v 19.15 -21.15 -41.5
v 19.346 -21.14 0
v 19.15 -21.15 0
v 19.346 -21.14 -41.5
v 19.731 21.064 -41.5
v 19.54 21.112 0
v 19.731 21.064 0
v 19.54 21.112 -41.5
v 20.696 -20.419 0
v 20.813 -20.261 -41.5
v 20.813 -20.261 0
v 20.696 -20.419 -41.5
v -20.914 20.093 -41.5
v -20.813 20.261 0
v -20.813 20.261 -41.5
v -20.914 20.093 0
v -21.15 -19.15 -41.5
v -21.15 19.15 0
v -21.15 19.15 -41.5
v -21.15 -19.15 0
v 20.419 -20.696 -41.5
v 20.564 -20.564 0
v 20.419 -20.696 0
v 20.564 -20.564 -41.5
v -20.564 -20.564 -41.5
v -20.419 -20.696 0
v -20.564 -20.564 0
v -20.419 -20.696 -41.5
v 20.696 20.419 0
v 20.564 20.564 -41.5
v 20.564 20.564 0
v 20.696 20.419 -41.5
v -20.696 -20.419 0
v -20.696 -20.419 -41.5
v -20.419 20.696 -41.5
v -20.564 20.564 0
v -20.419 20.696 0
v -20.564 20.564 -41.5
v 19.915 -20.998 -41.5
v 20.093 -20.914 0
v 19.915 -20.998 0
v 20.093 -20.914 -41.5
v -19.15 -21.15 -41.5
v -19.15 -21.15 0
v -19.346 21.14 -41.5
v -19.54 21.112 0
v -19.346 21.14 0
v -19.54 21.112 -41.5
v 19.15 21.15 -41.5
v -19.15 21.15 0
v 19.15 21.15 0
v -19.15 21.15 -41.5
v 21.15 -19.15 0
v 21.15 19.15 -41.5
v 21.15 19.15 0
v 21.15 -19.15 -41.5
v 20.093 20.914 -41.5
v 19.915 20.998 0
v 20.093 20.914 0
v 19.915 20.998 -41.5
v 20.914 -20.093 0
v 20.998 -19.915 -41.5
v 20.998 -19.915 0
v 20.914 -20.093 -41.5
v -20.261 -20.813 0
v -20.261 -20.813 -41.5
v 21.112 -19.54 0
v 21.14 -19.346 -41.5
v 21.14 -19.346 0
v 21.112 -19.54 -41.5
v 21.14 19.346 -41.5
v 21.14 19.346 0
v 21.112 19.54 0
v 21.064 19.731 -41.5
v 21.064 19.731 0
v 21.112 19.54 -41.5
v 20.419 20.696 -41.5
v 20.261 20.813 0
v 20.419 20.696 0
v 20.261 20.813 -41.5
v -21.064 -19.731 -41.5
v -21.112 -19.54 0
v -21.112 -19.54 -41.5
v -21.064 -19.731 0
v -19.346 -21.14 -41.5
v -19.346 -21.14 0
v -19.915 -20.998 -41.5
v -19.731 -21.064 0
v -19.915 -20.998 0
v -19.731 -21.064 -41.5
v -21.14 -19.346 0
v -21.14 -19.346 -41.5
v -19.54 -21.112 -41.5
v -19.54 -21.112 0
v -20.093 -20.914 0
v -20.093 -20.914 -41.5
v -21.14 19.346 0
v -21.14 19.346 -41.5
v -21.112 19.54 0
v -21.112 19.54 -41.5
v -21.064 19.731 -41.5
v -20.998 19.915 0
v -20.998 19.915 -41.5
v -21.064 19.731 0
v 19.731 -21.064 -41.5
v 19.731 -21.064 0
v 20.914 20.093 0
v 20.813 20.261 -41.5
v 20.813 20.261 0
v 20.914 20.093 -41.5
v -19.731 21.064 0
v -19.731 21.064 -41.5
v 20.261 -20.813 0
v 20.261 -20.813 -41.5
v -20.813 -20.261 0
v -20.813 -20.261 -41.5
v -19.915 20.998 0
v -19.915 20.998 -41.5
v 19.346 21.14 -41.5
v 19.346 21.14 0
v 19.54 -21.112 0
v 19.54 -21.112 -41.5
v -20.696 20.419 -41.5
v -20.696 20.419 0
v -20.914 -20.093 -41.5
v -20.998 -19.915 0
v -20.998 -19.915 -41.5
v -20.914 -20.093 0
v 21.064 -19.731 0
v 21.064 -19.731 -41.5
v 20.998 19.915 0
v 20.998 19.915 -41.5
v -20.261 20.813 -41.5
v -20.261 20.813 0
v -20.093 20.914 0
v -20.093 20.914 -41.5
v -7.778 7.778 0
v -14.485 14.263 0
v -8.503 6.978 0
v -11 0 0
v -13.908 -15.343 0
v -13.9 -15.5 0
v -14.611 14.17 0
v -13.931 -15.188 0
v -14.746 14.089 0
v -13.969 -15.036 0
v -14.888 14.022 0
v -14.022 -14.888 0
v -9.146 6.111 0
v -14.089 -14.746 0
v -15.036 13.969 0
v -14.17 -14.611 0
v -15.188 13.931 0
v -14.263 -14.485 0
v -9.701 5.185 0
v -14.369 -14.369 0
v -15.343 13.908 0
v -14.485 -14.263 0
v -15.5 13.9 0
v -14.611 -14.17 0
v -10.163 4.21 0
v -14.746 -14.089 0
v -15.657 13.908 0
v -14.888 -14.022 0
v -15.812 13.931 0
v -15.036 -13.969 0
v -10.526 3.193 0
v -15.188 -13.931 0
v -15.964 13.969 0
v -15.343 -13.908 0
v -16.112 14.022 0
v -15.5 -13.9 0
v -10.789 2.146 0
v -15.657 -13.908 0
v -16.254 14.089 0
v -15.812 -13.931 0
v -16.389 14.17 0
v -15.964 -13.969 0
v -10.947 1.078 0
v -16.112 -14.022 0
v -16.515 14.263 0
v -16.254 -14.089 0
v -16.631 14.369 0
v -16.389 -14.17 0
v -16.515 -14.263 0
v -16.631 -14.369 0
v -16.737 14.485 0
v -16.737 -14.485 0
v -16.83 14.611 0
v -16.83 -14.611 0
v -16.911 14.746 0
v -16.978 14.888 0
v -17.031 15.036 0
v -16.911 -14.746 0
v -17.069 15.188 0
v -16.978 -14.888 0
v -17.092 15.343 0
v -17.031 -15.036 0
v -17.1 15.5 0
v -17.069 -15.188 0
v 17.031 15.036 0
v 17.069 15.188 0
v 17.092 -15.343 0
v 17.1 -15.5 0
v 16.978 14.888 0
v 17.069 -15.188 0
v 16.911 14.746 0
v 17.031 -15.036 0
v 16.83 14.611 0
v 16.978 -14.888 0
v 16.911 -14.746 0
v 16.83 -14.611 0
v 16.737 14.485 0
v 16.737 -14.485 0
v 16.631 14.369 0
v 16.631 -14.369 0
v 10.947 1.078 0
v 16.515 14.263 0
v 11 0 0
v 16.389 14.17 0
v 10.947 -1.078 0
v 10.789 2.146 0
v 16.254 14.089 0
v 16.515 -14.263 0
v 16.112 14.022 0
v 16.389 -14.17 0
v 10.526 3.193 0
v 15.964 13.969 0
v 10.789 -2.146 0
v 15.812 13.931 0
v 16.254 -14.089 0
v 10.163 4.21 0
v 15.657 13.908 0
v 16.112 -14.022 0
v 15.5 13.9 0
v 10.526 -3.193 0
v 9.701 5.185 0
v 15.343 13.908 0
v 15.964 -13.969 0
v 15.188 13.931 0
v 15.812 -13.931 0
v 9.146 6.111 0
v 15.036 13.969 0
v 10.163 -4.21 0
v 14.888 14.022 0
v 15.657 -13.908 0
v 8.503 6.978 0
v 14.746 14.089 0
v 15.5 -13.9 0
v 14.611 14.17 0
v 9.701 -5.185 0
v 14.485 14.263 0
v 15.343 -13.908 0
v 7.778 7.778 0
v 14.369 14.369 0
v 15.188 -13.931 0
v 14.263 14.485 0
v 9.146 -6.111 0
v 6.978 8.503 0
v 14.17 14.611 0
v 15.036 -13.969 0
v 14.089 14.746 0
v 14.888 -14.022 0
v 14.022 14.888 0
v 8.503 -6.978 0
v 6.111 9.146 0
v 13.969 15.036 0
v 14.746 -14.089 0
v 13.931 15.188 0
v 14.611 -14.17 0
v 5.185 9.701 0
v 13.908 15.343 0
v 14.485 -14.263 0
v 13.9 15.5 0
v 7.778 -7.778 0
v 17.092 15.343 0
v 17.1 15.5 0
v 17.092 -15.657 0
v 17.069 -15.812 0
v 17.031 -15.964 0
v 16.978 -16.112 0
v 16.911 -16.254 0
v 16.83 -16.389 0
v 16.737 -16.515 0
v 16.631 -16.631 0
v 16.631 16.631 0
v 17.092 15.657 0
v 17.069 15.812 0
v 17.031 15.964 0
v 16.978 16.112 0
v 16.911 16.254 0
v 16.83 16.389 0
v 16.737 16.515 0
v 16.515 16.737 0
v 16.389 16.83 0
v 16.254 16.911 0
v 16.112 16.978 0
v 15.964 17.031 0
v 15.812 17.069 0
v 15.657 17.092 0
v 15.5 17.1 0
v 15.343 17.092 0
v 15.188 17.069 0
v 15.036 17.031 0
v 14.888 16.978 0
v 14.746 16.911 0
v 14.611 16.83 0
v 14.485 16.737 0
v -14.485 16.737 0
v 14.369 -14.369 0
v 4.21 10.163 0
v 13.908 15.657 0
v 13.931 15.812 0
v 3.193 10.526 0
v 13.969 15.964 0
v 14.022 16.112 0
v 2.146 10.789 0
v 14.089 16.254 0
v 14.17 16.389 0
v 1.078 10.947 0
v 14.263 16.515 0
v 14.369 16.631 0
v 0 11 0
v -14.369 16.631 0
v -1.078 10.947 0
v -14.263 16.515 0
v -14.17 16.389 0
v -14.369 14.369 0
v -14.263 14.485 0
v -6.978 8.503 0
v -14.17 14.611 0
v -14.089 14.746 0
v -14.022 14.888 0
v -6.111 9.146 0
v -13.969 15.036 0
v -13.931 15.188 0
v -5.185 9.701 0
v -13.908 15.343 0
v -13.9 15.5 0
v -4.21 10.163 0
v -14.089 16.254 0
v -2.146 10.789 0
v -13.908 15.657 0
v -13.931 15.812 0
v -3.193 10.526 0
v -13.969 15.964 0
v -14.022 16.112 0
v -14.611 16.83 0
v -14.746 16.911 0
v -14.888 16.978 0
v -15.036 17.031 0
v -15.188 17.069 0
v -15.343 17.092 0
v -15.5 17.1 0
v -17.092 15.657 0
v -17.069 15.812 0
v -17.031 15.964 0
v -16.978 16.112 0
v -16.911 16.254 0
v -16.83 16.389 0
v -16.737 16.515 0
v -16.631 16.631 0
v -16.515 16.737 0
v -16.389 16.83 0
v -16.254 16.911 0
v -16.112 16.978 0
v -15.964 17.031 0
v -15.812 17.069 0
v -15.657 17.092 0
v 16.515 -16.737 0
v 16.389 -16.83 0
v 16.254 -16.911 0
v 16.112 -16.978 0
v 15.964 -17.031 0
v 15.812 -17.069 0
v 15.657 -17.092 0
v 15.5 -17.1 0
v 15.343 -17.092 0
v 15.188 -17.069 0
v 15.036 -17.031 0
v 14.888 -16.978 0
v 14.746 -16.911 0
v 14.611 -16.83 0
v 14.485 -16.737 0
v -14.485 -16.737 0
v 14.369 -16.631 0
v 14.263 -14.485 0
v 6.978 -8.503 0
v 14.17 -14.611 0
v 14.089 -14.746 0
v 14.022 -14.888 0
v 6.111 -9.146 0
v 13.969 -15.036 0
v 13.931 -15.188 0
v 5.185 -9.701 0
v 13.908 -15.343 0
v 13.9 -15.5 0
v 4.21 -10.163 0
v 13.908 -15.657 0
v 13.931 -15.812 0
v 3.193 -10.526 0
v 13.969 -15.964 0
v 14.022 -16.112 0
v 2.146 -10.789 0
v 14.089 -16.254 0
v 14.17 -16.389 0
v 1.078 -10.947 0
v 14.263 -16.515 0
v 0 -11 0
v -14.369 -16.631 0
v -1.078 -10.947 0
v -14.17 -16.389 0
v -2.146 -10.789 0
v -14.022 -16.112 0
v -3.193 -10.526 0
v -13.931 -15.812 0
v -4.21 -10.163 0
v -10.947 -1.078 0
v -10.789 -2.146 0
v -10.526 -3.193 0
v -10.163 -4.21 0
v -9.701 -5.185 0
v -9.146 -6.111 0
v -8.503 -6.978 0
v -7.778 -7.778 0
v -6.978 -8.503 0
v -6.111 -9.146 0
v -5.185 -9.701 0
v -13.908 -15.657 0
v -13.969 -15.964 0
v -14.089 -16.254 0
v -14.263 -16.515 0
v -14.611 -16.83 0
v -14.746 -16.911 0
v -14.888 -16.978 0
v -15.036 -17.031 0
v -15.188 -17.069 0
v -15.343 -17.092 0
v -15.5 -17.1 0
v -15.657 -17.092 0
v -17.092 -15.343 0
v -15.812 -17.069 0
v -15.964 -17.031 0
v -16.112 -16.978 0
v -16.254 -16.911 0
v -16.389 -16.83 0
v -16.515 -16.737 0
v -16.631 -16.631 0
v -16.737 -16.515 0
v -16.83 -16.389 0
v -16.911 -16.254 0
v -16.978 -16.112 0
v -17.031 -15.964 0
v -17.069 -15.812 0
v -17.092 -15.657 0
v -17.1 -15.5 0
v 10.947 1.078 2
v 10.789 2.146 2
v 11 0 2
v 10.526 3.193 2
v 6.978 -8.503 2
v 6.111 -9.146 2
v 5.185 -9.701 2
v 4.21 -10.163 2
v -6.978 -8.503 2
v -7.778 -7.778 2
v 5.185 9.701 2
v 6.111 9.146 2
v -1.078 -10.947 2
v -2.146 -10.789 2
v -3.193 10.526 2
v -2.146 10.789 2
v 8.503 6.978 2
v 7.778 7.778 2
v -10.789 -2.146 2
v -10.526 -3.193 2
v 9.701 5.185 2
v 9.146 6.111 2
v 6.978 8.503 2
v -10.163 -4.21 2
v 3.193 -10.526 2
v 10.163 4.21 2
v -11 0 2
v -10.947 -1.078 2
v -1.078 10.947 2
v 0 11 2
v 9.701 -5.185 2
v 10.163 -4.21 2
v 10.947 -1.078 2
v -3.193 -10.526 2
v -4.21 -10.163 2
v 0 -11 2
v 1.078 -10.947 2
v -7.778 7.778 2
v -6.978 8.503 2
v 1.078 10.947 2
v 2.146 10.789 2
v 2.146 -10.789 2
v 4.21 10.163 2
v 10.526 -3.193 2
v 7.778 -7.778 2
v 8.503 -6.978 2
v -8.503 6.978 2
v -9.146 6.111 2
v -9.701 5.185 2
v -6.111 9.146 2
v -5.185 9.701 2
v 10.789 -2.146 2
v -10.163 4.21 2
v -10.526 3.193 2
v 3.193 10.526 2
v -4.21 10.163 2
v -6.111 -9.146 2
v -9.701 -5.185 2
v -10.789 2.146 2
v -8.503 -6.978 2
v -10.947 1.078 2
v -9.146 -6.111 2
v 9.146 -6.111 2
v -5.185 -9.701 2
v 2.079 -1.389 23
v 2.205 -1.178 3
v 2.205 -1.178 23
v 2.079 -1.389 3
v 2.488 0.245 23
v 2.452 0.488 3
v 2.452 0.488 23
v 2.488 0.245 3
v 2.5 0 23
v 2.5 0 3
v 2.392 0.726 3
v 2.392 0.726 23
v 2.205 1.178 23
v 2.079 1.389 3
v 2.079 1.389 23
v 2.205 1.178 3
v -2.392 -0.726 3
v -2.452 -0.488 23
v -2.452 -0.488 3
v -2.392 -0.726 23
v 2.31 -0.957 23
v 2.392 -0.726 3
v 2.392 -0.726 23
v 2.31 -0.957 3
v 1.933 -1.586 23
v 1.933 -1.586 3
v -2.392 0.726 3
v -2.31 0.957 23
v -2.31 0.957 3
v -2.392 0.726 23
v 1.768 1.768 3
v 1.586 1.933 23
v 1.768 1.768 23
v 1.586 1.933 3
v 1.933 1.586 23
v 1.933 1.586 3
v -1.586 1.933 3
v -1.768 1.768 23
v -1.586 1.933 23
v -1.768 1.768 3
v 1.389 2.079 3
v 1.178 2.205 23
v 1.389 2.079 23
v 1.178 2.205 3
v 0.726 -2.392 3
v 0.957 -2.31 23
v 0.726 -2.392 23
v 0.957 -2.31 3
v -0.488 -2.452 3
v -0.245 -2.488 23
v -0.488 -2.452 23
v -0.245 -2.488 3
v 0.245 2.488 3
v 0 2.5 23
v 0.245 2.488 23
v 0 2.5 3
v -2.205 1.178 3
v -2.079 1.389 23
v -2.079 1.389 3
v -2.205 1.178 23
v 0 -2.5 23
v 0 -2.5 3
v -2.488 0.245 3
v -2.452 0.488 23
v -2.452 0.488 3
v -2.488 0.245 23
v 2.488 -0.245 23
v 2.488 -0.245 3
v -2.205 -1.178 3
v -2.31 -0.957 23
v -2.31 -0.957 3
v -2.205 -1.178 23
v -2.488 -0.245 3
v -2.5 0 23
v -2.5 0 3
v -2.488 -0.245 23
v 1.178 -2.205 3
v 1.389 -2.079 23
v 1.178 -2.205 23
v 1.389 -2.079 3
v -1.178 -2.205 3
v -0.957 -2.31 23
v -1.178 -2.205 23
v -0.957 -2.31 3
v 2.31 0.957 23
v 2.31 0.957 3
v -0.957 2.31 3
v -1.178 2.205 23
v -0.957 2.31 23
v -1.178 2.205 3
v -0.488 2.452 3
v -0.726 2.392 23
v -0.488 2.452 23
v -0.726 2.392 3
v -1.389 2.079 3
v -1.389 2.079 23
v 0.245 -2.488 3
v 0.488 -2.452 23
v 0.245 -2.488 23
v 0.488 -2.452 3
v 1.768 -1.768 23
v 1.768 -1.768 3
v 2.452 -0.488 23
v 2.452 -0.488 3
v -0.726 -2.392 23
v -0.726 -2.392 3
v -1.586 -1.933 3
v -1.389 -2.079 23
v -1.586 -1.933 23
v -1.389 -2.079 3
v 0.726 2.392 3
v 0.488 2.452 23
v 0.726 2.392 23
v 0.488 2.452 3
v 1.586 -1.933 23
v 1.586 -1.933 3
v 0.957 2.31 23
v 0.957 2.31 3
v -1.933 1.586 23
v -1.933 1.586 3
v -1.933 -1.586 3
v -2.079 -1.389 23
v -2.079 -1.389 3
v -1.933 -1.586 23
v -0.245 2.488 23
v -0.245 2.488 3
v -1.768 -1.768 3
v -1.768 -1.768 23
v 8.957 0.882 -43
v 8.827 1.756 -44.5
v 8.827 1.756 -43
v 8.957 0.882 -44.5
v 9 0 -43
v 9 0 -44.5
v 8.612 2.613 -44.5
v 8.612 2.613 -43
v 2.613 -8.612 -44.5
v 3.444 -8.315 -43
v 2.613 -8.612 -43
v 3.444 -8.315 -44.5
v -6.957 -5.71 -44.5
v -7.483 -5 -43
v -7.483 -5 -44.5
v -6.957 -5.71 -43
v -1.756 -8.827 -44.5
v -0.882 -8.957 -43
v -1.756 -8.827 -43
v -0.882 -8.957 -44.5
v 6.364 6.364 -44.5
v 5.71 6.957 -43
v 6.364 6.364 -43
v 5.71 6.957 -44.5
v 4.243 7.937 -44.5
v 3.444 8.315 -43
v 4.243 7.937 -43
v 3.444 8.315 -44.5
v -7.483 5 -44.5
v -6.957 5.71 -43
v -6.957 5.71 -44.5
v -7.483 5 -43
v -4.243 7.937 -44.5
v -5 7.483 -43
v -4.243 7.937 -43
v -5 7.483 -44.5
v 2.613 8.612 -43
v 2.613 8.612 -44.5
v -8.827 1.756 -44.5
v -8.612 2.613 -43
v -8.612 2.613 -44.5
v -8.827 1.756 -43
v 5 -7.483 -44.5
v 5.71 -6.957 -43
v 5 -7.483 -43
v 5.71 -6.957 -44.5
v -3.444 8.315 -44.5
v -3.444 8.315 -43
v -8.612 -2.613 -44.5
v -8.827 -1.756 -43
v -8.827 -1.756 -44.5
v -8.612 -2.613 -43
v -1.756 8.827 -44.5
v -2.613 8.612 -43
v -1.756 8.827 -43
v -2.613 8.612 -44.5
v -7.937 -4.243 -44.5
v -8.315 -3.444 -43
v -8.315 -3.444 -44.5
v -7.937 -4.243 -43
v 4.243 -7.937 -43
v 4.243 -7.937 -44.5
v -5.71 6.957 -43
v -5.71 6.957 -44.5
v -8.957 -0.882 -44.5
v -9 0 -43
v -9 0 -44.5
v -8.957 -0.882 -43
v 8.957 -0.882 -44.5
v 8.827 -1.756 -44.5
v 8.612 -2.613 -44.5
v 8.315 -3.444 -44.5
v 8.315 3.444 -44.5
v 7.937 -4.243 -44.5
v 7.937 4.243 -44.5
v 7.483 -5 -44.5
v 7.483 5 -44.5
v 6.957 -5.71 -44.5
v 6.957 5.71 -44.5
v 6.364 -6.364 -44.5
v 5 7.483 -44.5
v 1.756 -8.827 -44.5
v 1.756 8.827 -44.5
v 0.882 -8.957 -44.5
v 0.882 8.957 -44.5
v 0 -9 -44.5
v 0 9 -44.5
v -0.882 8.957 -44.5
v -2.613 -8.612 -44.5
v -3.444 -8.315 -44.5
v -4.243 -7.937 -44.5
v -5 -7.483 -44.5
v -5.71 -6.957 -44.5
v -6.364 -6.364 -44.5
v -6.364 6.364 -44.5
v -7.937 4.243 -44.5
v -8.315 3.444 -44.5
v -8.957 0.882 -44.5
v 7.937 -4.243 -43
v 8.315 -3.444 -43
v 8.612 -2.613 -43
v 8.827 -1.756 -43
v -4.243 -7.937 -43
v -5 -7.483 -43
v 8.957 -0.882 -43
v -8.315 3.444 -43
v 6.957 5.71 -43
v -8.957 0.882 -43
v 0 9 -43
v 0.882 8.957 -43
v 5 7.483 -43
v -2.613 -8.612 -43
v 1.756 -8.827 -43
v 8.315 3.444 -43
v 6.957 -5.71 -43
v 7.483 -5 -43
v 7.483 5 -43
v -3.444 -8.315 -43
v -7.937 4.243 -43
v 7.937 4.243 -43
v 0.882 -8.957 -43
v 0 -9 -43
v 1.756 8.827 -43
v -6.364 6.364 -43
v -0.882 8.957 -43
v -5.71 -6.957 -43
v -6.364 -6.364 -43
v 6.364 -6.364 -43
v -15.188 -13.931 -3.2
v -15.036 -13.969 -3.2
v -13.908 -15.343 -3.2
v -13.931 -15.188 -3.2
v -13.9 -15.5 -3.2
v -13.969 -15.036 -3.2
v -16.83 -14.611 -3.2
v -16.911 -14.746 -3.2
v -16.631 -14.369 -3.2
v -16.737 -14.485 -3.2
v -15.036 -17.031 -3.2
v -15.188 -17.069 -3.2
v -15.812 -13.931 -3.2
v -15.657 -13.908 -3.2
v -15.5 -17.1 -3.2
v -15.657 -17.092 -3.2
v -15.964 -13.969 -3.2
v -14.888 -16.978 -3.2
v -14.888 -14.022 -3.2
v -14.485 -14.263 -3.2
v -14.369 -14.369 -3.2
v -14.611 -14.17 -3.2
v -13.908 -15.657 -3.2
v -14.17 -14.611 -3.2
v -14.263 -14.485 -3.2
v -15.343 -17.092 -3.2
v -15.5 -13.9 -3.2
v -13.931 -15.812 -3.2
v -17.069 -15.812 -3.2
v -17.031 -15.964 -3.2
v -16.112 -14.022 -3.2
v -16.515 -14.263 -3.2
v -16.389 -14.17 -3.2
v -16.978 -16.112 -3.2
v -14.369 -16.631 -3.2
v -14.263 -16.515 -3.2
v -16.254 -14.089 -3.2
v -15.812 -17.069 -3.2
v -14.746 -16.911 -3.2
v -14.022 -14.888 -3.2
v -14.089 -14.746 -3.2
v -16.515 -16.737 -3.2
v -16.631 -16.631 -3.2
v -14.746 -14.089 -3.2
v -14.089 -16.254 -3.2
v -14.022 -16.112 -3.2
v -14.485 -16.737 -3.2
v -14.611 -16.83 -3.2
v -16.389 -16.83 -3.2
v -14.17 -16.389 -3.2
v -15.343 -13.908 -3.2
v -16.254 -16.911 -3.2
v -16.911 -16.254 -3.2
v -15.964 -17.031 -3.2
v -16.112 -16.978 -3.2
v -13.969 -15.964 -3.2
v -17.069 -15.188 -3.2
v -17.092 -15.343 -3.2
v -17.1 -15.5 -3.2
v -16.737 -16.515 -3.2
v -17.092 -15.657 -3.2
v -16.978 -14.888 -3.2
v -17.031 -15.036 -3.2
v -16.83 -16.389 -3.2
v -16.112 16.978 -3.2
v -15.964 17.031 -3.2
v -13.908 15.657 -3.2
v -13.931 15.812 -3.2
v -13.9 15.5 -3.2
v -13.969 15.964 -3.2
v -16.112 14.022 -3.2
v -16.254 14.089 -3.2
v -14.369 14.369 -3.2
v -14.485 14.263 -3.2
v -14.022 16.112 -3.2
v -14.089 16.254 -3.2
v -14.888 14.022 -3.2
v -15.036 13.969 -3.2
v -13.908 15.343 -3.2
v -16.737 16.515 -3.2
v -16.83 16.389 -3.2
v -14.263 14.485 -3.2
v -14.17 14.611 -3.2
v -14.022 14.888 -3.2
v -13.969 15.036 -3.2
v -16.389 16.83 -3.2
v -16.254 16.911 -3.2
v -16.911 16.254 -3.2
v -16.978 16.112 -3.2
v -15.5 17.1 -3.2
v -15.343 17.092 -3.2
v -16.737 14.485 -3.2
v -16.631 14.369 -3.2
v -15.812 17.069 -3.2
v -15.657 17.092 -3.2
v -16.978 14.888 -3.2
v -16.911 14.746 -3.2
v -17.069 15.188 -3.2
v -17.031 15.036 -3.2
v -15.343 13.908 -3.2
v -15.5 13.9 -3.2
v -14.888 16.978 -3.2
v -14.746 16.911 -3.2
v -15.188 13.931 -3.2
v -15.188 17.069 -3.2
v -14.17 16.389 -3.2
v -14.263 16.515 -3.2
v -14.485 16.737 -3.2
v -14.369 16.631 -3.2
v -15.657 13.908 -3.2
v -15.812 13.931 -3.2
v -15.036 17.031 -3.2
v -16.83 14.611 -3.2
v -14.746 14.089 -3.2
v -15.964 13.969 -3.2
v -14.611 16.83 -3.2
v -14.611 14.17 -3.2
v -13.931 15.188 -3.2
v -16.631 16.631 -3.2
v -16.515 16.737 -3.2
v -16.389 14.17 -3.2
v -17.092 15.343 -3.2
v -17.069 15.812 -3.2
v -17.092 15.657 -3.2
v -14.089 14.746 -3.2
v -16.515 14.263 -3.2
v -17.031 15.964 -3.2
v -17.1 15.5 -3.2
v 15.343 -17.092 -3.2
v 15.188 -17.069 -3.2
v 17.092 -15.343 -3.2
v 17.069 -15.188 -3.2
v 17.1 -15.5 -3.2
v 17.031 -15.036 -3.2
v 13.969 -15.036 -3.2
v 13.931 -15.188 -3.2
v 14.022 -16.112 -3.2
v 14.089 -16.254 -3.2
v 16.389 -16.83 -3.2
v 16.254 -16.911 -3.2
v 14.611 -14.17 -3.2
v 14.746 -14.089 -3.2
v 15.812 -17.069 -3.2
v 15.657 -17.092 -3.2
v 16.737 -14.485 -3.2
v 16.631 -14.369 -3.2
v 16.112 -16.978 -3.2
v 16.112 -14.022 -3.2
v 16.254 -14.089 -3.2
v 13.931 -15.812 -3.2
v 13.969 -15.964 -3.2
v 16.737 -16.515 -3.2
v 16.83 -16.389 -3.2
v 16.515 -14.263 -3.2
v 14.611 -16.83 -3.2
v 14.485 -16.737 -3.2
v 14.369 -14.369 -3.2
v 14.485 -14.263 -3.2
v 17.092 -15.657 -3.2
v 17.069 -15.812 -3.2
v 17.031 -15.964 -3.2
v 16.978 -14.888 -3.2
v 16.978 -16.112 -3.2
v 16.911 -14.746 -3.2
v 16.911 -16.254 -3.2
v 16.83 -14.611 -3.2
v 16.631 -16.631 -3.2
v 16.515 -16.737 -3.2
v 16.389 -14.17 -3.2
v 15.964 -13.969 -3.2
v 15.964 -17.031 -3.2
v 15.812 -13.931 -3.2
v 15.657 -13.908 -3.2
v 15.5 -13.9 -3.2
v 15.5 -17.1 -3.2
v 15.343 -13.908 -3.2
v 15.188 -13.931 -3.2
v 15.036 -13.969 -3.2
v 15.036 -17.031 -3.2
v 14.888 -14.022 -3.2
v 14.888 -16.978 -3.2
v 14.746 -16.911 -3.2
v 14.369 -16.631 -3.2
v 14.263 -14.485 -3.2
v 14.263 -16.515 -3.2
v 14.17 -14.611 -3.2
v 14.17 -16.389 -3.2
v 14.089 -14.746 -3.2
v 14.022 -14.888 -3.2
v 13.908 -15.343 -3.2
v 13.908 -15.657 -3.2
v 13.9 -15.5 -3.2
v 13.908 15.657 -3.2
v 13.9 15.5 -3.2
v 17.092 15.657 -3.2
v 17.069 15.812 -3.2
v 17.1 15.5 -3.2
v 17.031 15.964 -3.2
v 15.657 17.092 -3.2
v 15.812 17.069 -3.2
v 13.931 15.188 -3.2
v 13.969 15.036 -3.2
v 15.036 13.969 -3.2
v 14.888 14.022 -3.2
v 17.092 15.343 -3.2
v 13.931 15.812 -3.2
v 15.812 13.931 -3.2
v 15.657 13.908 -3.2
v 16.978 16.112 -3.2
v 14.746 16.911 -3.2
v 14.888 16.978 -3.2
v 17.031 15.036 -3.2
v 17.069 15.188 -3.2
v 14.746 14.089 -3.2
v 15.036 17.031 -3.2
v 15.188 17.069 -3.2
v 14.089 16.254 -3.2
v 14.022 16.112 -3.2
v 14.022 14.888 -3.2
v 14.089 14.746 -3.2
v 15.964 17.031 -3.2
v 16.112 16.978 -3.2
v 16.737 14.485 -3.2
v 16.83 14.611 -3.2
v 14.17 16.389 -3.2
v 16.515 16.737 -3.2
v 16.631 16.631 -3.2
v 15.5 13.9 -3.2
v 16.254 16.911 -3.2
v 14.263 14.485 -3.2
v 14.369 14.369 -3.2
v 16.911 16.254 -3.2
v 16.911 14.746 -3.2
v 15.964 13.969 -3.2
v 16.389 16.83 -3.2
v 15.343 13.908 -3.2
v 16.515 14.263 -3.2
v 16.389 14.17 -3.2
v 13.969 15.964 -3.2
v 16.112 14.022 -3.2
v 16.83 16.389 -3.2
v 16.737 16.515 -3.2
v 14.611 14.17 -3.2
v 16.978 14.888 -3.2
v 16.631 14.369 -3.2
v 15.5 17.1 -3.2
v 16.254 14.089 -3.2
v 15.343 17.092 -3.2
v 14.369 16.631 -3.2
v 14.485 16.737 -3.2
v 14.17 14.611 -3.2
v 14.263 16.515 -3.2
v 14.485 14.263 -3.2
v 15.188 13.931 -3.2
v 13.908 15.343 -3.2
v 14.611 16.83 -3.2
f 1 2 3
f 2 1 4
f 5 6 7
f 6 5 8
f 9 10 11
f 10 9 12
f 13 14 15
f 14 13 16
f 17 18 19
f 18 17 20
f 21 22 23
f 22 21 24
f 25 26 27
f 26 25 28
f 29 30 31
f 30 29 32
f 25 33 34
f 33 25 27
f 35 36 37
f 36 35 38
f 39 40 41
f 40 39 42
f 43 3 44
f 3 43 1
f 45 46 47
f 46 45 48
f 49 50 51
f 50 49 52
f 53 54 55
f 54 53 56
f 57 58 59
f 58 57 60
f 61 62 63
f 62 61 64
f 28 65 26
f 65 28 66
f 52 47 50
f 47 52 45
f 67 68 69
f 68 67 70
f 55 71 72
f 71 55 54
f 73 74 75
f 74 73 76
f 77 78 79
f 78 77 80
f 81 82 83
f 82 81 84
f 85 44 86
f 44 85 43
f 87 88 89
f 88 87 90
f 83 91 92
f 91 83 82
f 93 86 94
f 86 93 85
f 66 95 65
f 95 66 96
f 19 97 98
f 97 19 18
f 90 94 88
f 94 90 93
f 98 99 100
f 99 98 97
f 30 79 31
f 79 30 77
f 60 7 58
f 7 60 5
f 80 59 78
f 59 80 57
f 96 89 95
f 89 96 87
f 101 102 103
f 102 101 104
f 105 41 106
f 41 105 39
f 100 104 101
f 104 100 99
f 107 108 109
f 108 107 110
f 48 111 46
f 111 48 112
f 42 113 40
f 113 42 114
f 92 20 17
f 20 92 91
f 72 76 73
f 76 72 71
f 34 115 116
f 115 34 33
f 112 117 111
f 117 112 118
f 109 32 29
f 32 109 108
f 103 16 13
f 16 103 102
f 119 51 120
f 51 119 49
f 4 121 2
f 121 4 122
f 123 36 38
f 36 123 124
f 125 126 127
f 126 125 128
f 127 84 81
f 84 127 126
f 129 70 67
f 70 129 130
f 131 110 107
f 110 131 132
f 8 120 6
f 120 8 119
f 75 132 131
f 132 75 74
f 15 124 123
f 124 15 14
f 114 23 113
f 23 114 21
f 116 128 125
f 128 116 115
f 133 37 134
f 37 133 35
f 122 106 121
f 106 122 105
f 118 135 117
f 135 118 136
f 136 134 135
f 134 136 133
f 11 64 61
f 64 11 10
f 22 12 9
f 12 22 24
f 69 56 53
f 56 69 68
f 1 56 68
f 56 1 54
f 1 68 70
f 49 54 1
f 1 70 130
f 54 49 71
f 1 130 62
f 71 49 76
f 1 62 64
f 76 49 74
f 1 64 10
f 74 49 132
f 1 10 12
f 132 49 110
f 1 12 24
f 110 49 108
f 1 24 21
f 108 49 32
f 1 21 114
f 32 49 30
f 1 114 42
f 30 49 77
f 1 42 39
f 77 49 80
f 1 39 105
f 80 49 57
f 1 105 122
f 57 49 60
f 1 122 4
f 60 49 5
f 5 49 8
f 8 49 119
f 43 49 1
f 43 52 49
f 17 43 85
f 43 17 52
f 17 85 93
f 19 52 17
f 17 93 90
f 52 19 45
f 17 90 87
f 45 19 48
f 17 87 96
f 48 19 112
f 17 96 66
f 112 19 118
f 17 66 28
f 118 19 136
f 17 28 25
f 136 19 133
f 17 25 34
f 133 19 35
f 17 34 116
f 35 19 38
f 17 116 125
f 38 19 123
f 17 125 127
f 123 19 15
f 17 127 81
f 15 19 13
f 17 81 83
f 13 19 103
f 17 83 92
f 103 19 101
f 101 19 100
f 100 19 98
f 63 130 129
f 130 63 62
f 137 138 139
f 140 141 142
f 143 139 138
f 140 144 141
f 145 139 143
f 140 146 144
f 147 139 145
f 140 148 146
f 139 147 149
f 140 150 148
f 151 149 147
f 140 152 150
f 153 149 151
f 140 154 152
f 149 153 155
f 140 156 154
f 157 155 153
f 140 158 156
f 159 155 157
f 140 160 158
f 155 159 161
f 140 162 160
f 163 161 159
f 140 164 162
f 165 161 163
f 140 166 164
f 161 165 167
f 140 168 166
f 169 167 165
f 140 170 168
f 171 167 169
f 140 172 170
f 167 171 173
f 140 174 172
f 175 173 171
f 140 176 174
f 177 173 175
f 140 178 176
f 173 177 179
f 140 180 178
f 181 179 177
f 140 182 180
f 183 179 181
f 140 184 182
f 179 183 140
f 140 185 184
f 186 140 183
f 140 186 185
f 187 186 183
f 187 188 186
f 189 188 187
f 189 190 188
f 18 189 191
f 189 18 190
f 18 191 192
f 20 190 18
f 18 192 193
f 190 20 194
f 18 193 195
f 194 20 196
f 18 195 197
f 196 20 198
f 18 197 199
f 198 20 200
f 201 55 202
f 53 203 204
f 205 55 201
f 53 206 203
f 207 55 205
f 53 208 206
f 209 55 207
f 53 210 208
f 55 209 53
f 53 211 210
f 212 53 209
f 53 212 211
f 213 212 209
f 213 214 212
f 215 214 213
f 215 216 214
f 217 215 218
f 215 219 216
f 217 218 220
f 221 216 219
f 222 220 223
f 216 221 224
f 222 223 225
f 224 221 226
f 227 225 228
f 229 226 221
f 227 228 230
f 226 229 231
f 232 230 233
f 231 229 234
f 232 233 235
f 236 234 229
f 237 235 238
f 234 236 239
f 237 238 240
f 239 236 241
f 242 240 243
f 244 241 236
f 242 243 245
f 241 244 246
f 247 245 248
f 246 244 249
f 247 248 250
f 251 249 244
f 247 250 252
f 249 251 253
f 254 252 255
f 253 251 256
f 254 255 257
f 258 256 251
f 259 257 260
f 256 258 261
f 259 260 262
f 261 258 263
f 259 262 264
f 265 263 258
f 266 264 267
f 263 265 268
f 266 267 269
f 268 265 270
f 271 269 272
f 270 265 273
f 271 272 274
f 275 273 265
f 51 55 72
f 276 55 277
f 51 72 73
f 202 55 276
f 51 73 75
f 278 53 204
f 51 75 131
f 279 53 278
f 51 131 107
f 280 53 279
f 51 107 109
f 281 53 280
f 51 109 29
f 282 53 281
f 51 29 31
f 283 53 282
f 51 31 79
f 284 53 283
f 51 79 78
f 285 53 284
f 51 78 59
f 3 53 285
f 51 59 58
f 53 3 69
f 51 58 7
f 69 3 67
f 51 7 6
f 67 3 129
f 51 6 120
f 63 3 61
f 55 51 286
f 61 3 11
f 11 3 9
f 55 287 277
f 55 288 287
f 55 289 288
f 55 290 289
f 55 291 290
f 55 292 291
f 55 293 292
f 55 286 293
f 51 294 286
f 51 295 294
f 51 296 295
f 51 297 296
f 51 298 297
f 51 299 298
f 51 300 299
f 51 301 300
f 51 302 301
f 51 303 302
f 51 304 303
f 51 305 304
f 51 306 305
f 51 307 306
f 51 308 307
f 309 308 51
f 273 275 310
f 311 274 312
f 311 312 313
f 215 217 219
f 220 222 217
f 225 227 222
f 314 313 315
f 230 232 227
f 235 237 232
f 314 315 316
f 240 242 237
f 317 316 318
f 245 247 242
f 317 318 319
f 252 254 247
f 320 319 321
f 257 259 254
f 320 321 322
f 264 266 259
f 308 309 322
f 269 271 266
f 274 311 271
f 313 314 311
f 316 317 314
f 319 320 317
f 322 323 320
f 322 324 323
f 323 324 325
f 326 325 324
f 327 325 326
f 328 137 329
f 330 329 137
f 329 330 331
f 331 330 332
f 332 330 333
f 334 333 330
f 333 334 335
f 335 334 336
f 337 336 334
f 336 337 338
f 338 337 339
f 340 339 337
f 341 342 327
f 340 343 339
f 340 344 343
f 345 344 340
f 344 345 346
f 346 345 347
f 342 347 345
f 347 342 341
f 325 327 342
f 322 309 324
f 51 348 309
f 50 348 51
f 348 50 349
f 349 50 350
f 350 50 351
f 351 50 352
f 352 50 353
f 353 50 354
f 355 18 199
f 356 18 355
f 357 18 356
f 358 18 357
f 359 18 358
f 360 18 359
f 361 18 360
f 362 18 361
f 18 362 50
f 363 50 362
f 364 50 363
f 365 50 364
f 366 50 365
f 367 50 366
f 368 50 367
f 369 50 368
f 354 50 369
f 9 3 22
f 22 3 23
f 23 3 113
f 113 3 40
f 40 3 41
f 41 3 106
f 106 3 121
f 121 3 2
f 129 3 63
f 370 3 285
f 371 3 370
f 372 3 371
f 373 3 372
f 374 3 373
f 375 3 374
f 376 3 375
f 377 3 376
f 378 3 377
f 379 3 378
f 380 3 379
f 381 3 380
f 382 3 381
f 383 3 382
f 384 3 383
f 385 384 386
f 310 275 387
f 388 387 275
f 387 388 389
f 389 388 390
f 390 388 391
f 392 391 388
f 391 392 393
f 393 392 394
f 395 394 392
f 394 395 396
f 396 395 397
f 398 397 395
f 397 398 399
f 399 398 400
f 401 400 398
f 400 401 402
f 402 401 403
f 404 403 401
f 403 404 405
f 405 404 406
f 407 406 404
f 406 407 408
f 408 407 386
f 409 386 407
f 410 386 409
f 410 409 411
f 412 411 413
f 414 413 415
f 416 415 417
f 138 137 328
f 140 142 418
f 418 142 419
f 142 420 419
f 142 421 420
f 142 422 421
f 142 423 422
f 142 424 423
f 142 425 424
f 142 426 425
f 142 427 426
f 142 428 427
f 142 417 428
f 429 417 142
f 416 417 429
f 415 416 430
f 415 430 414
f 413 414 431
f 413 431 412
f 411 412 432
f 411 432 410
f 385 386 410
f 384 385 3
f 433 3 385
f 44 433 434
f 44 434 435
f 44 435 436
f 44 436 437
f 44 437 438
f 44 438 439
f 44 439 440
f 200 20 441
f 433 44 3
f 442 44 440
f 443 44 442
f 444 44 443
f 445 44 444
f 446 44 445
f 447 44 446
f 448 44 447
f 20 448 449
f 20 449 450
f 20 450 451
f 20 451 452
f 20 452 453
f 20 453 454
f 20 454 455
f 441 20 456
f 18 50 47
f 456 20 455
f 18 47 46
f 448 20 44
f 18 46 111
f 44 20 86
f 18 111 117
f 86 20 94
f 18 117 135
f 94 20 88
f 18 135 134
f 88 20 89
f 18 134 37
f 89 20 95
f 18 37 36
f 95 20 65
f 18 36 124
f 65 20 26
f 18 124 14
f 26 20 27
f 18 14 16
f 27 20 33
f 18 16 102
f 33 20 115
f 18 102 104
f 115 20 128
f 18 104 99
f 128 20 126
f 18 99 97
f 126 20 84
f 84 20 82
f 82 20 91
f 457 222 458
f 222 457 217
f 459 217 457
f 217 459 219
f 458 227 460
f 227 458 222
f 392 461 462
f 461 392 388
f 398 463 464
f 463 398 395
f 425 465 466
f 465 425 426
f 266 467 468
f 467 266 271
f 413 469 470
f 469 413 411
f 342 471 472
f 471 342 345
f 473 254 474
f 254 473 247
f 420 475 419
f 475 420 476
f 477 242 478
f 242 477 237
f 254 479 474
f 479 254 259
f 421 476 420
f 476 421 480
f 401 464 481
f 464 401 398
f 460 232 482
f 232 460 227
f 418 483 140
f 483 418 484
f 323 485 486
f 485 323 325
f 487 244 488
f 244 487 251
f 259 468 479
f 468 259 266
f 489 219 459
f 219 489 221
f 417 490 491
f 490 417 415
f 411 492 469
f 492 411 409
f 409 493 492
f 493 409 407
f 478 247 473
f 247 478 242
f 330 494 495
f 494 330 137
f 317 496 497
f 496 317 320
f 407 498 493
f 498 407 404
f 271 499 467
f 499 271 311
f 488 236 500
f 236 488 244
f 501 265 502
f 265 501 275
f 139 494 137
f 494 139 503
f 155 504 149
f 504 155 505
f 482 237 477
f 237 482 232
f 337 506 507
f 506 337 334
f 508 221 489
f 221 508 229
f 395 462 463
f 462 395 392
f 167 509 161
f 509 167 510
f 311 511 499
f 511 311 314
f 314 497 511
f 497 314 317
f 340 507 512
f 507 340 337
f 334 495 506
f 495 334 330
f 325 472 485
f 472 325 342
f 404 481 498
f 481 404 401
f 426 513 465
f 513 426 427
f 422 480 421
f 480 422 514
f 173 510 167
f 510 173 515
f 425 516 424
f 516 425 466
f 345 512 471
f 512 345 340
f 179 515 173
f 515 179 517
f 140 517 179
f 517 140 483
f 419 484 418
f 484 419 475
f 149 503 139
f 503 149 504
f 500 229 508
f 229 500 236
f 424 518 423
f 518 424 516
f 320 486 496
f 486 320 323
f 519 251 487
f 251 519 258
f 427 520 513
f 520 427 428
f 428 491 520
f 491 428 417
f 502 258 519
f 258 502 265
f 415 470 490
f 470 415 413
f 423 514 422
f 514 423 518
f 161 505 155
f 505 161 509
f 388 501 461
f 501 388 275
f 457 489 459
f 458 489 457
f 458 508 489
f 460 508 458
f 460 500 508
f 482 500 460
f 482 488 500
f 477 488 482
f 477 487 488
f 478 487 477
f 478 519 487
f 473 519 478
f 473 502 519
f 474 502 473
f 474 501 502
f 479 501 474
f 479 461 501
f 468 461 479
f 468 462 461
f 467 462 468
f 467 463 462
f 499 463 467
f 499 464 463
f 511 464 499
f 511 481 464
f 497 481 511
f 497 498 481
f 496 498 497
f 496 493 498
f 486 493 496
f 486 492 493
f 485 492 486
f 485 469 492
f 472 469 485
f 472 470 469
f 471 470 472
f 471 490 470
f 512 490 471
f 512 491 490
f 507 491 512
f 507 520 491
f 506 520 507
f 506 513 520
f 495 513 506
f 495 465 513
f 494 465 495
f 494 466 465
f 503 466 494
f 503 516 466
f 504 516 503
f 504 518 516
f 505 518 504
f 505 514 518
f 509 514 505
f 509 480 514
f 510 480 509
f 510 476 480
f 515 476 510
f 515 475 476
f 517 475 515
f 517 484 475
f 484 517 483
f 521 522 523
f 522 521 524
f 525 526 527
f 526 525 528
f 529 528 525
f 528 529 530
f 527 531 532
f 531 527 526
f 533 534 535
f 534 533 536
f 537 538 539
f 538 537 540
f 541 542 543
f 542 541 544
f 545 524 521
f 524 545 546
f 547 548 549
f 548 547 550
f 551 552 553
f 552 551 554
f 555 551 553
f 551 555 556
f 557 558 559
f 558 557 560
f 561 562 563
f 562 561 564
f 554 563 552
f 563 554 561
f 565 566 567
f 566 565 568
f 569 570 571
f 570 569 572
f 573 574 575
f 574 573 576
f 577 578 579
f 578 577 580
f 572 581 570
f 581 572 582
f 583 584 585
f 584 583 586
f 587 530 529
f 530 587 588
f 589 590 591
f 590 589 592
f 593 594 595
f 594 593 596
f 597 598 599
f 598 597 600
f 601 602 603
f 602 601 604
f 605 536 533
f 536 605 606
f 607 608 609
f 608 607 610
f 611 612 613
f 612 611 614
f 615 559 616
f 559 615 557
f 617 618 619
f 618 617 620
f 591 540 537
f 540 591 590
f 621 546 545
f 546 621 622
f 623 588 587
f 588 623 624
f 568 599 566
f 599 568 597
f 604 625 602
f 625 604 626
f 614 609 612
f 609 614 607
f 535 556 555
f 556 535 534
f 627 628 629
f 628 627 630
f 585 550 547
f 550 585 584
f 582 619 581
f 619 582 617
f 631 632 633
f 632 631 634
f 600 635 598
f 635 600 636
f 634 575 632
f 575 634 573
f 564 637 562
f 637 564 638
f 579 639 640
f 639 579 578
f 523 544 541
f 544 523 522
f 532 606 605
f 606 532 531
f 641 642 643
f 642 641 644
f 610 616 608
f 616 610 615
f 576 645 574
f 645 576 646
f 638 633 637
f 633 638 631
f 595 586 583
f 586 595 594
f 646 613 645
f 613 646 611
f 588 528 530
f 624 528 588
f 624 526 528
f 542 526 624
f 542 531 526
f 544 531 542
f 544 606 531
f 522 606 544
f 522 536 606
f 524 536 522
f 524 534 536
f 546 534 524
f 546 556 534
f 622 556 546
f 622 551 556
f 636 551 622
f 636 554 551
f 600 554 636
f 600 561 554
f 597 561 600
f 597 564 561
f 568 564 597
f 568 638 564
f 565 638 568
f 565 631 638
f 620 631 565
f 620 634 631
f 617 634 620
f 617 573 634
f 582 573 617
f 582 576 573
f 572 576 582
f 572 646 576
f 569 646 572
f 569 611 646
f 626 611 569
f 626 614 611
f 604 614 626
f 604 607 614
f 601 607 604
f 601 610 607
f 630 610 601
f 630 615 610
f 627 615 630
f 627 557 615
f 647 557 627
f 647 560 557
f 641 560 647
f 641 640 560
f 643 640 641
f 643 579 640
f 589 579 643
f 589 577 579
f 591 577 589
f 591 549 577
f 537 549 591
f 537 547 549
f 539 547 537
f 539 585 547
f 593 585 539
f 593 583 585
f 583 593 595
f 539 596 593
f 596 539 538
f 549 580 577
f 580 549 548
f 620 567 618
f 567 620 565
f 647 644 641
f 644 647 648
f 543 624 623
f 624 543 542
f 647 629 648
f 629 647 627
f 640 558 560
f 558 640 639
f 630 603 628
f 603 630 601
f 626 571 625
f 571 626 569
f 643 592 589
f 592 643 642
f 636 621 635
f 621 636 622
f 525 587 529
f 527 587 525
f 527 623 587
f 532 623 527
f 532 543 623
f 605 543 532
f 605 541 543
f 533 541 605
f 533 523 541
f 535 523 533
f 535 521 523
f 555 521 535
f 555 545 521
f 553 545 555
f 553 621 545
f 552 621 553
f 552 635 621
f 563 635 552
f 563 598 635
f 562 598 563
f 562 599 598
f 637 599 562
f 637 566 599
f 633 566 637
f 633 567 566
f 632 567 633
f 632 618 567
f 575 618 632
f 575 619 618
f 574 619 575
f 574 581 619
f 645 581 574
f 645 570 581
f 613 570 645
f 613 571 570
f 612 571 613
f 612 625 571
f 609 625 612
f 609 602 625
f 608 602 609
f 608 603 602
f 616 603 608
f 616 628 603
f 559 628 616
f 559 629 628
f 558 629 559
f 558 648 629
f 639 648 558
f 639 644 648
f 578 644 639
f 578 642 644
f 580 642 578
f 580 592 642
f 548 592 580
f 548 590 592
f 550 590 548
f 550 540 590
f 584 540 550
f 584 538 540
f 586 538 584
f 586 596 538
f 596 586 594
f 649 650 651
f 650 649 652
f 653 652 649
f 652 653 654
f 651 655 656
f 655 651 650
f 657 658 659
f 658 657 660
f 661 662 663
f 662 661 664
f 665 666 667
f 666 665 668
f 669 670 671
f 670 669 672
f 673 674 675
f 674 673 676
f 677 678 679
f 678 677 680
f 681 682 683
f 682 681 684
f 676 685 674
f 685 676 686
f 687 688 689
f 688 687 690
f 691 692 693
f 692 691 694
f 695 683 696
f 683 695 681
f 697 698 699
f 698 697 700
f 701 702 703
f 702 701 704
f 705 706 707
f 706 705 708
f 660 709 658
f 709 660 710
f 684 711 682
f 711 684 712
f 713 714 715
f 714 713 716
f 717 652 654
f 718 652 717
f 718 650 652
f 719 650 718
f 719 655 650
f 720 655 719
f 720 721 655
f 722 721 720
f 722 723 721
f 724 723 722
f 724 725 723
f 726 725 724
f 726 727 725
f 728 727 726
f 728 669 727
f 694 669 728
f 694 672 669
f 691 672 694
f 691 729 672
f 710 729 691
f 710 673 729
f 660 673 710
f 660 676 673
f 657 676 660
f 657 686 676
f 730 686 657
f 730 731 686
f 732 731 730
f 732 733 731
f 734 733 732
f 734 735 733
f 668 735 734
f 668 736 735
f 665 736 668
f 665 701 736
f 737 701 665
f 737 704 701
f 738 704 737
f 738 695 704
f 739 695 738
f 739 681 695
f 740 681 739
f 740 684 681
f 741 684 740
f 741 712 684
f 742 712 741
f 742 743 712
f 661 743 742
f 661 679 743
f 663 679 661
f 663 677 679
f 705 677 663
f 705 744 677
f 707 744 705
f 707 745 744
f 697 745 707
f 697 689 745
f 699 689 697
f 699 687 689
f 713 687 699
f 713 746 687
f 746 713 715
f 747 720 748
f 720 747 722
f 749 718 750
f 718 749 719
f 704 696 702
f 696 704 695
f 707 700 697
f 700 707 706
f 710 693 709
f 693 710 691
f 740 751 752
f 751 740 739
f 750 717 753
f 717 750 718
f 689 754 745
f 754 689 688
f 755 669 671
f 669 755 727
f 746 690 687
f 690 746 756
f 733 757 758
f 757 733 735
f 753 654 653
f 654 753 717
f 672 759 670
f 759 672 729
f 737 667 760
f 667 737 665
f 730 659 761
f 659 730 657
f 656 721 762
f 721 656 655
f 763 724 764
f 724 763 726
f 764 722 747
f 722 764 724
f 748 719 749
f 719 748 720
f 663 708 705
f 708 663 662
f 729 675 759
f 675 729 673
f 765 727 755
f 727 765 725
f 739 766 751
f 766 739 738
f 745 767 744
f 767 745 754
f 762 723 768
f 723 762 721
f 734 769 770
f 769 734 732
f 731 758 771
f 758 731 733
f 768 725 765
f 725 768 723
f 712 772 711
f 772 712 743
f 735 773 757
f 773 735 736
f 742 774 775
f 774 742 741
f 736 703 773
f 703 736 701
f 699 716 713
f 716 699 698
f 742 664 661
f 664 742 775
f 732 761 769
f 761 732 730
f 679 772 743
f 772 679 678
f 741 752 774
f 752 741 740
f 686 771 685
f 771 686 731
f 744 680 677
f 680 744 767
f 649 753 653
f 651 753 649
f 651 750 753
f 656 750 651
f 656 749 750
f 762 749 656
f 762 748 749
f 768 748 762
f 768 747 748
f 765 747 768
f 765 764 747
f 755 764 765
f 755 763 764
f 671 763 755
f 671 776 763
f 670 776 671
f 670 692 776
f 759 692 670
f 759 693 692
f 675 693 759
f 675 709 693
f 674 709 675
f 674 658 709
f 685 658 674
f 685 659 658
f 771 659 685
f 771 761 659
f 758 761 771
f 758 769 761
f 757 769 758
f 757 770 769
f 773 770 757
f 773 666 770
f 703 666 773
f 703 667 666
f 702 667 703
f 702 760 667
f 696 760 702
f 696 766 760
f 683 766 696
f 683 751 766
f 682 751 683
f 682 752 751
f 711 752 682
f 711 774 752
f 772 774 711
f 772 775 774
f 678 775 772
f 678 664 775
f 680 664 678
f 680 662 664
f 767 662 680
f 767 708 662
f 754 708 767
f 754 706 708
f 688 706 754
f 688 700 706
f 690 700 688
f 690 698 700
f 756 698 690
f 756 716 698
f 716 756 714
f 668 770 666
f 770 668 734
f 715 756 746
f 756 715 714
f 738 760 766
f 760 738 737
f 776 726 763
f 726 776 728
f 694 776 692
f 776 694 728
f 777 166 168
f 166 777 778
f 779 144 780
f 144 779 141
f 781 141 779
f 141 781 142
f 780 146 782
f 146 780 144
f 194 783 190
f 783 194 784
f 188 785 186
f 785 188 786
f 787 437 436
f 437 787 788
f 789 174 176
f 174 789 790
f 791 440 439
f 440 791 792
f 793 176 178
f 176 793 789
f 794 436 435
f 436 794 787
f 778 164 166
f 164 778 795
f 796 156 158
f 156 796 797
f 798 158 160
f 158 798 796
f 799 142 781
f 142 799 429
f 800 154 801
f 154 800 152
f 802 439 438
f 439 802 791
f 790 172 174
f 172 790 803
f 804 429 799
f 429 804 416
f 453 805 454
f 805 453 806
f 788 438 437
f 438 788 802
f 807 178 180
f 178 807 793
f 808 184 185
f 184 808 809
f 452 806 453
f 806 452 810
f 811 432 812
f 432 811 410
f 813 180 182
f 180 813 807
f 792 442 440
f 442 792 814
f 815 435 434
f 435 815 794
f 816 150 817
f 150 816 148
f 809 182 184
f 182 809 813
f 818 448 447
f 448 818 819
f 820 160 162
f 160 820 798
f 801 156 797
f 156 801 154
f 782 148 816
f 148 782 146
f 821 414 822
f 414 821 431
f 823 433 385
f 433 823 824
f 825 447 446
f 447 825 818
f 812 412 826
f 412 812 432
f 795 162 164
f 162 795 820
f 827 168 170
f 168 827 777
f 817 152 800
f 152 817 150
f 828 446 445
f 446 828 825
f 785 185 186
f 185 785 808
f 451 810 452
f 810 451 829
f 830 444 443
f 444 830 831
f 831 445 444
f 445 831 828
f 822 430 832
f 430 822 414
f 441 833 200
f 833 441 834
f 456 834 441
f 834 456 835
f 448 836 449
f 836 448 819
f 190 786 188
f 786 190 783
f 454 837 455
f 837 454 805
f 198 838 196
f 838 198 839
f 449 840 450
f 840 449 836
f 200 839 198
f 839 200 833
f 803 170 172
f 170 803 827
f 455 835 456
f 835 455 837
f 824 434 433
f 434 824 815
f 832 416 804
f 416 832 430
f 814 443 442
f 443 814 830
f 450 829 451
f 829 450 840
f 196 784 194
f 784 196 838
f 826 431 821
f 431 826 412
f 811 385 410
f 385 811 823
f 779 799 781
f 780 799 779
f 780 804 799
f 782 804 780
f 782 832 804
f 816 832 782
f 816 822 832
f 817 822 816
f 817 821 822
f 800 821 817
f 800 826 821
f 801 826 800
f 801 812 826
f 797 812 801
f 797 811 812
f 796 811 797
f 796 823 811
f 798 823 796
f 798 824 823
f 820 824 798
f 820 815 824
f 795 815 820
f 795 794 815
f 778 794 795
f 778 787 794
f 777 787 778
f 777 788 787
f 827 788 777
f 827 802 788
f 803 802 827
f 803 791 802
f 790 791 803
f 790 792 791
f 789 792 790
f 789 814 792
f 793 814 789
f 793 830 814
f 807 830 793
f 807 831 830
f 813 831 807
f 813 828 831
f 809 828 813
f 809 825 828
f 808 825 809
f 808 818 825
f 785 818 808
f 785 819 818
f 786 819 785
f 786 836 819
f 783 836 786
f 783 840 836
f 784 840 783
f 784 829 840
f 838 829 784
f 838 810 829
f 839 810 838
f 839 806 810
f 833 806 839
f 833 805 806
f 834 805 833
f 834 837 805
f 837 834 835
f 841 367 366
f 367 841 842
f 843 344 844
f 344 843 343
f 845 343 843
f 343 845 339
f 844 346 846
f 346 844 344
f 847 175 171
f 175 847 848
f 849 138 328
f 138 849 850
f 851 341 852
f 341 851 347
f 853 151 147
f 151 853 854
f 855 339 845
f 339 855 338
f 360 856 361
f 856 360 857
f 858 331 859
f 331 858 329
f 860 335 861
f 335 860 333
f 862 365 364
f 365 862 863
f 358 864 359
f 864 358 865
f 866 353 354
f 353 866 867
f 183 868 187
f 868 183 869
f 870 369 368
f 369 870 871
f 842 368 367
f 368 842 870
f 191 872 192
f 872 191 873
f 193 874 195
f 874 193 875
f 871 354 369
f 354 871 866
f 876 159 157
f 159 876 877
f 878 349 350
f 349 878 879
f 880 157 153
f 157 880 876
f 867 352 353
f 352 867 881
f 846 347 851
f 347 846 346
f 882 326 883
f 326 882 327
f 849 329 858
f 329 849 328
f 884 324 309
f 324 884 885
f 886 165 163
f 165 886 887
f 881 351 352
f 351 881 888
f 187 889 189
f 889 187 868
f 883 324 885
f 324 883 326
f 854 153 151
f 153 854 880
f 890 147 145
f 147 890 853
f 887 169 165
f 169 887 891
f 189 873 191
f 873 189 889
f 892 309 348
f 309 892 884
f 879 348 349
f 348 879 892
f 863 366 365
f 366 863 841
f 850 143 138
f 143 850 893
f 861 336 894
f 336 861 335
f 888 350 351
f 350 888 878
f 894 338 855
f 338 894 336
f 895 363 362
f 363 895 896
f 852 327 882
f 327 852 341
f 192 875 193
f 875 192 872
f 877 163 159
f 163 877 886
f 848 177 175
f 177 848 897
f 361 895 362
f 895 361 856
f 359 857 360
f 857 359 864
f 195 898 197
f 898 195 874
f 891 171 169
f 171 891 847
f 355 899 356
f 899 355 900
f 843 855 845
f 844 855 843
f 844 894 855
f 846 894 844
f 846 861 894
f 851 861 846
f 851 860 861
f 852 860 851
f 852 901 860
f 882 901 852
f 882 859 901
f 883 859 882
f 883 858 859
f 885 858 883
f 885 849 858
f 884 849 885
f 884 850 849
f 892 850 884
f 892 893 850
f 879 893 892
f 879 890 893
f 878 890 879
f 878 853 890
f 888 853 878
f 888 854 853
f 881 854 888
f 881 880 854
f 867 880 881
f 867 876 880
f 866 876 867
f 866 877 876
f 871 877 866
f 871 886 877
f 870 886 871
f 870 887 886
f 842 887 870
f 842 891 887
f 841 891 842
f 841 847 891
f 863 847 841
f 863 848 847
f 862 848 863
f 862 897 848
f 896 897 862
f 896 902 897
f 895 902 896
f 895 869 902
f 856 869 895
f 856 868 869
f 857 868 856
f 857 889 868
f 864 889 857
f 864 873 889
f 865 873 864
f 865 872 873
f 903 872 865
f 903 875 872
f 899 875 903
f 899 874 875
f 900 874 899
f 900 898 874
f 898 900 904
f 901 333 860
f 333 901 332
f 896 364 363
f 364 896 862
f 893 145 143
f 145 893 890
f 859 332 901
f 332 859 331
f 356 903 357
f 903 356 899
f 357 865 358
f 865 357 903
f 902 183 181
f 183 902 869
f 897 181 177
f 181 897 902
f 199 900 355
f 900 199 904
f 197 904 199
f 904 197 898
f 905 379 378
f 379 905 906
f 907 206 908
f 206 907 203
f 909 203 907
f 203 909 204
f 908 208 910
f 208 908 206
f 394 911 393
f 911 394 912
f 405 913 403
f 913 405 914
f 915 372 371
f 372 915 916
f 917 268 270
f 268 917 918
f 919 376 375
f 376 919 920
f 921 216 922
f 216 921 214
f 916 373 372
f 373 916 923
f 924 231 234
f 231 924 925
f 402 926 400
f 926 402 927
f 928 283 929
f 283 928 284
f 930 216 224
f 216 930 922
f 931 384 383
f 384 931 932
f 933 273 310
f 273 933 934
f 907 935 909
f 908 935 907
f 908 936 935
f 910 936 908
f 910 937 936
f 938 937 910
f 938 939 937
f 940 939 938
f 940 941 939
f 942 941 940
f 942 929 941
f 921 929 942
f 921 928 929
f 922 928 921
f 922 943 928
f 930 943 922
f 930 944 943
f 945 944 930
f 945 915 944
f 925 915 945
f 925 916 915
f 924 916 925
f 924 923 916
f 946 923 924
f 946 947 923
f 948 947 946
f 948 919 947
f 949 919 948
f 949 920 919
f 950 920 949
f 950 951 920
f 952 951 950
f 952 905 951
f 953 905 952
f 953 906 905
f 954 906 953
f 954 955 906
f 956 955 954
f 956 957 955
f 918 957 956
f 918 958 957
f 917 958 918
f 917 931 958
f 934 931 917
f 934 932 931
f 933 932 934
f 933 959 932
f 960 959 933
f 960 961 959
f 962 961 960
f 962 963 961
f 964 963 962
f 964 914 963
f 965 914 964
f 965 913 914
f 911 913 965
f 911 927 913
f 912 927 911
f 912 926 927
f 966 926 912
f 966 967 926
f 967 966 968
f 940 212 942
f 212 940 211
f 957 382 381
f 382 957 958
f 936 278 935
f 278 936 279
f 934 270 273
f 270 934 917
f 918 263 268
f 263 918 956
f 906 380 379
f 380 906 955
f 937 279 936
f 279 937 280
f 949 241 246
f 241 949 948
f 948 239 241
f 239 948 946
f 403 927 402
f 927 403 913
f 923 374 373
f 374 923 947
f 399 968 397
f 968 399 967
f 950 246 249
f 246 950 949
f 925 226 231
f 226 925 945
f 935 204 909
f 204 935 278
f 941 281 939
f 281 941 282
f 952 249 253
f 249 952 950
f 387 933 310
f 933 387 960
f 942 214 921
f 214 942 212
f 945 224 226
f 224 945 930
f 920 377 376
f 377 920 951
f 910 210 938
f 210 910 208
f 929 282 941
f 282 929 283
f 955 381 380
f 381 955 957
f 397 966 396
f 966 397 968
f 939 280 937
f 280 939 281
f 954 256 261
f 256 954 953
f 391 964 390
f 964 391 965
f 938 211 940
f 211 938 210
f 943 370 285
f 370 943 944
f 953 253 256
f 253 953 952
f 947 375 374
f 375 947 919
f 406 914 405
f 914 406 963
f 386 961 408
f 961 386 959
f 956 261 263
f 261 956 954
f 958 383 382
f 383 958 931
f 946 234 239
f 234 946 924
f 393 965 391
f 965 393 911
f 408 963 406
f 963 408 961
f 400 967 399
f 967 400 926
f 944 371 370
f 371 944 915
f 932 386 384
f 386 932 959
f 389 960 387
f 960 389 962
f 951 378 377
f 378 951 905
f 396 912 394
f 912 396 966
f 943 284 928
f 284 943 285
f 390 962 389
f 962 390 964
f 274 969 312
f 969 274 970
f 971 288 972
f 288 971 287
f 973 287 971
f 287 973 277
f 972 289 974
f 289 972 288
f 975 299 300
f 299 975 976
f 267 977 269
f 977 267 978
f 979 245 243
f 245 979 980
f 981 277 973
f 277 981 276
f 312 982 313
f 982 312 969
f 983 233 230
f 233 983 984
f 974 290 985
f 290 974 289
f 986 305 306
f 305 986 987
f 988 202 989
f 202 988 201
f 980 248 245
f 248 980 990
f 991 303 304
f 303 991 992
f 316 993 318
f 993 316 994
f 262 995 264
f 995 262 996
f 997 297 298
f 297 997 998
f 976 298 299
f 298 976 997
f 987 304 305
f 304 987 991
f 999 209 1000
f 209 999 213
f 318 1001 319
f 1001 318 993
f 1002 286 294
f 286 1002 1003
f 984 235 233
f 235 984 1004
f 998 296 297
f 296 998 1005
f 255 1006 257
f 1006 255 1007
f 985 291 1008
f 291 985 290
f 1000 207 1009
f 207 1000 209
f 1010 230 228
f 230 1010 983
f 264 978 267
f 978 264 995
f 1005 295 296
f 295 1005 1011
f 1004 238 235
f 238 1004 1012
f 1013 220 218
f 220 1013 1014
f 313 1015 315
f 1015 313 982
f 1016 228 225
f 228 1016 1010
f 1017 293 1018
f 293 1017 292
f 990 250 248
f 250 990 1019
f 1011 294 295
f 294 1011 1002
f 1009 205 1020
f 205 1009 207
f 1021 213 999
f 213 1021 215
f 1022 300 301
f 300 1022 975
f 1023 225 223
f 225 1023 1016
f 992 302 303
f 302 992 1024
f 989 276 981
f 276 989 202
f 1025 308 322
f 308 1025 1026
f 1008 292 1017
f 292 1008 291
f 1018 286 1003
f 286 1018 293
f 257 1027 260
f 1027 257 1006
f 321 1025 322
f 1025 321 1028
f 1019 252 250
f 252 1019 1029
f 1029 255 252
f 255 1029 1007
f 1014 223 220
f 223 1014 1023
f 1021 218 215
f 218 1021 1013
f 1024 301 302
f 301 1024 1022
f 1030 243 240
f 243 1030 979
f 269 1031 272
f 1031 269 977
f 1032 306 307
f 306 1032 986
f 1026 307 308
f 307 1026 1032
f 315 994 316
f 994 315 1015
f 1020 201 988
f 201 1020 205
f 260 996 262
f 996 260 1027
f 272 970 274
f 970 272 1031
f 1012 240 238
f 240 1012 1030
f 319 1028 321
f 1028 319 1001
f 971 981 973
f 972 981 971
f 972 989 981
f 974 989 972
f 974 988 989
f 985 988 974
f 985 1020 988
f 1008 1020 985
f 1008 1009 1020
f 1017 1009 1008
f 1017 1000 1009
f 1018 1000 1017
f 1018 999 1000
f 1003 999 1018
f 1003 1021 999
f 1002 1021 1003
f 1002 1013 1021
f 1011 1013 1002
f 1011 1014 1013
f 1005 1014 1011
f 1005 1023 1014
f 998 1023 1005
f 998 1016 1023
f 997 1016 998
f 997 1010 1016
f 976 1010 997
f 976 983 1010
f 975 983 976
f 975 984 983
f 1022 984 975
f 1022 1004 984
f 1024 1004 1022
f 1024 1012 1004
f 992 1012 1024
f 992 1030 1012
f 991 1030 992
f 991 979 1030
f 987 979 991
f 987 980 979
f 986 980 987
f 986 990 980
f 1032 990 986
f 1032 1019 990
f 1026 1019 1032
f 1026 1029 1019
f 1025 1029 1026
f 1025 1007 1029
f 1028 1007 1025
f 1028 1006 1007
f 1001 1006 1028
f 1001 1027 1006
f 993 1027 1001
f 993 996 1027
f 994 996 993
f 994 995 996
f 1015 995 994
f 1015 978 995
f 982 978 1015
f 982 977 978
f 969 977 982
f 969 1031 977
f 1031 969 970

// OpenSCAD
// NEMA-style stepper motor (single connected solid)
// Target critical dims:
// - face_width = 42.3 mm
// - body_length = 40.0 mm
// - shaft_diameter = 5.0 mm
// - mount_hole_spacing = 31.0 mm

$fn = 64;

// Parameters
face_width = 42.3;
body_width = 42.3;
body_length = 40.0;

front_face_thickness = 3.0;

shaft_diameter = 5.0;
shaft_length = 20.0;
shaft_offset_from_face = 0.0;

mount_hole_spacing = 31.0;
mount_hole_diameter = 3.2;

corner_radius = 2.0;

shaft_boss_diameter = 22.0;
shaft_boss_height = 2.0;

rear_boss_diameter = 18.0;
rear_boss_height = 1.5;

eps = 0.2;

// Rounded rectangle prism (centered)
module rounded_cube_xy(size=[10,10,10], r=1, center=true) {
    sx = size[0]; sy = size[1]; sz = size[2];
    translate(center ? [0,0,0] : [sx/2, sy/2, sz/2])
        linear_extrude(height=sz, center=true)
            offset(r=r)
                square([sx-2*r, sy-2*r], center=true);
}

// Main motor solid with holes subtracted (still one connected solid)
module stepper_motor() {

    // Z reference: front face outer surface at z=0
    // Body extends to negative Z, shaft to positive Z.
    z_face_center = -front_face_thickness/2;
    z_body_center = -(front_face_thickness + body_length)/2;
    z_front_boss_center = shaft_boss_height/2; // boss starts at z=0
    z_shaft_center = front_face_thickness + shaft_offset_from_face + shaft_length/2; // shaft starts at z=front_face_thickness+offset
    z_rear_boss_center = -(front_face_thickness + body_length) - rear_boss_height/2; // rear boss behind body

    difference() {
        union() {
            // Motor body (rounded)
            translate([0,0,z_body_center])
                rounded_cube_xy([body_width, body_width, body_length], r=corner_radius, center=true);

            // Front face plate (slightly rounded)
            translate([0,0,z_face_center])
                rounded_cube_xy([face_width, face_width, front_face_thickness], r=corner_radius, center=true);

            // Front circular boss (register)
            translate([0,0,z_front_boss_center])
                cylinder(h=shaft_boss_height, r=shaft_boss_diameter/2, center=true);

            // Shaft (5mm dia) connected to face (starts at z=front_face_thickness+offset)
            translate([0,0,z_shaft_center])
                cylinder(h=shaft_length, r=shaft_diameter/2, center=true);

            // Rear boss (small nub) connected to back of body
            translate([0,0,z_rear_boss_center])
                cylinder(h=rear_boss_height, r=rear_boss_diameter/2, center=true);
        }

        // Mounting holes through front face plate (clear, verifiable 31mm spacing)
        // Holes go through the front face thickness only (plus eps), starting at z=0 downwards.
        for (x = [-1, 1])
            for (y = [-1, 1])
                translate([x*mount_hole_spacing/2, y*mount_hole_spacing/2, -front_face_thickness/2])
                    cylinder(h=front_face_thickness + 2*eps, r=mount_hole_diameter/2, center=true);
    }
}

stepper_motor();
